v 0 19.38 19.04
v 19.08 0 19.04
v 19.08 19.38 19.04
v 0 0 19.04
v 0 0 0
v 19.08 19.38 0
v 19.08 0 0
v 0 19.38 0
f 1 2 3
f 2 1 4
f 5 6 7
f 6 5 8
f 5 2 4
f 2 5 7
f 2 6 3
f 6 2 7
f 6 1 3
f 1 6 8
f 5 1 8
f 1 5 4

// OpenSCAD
side = 20;
actual_x = 20.92;
actual_y = 20.62;
actual_z = 20.96;

x_scale = 1 + ((side - actual_x) / side);
y_scale = 1 + ((side - actual_y) / side);
z_scale = 1 + ((side - actual_z) / side);

echo("X scale: ", x_scale, " Y scale: ", y_scale, " Z scale: ", z_scale);

scale([x_scale, y_scale, z_scale])
 cube(size=[side, side, side]);
